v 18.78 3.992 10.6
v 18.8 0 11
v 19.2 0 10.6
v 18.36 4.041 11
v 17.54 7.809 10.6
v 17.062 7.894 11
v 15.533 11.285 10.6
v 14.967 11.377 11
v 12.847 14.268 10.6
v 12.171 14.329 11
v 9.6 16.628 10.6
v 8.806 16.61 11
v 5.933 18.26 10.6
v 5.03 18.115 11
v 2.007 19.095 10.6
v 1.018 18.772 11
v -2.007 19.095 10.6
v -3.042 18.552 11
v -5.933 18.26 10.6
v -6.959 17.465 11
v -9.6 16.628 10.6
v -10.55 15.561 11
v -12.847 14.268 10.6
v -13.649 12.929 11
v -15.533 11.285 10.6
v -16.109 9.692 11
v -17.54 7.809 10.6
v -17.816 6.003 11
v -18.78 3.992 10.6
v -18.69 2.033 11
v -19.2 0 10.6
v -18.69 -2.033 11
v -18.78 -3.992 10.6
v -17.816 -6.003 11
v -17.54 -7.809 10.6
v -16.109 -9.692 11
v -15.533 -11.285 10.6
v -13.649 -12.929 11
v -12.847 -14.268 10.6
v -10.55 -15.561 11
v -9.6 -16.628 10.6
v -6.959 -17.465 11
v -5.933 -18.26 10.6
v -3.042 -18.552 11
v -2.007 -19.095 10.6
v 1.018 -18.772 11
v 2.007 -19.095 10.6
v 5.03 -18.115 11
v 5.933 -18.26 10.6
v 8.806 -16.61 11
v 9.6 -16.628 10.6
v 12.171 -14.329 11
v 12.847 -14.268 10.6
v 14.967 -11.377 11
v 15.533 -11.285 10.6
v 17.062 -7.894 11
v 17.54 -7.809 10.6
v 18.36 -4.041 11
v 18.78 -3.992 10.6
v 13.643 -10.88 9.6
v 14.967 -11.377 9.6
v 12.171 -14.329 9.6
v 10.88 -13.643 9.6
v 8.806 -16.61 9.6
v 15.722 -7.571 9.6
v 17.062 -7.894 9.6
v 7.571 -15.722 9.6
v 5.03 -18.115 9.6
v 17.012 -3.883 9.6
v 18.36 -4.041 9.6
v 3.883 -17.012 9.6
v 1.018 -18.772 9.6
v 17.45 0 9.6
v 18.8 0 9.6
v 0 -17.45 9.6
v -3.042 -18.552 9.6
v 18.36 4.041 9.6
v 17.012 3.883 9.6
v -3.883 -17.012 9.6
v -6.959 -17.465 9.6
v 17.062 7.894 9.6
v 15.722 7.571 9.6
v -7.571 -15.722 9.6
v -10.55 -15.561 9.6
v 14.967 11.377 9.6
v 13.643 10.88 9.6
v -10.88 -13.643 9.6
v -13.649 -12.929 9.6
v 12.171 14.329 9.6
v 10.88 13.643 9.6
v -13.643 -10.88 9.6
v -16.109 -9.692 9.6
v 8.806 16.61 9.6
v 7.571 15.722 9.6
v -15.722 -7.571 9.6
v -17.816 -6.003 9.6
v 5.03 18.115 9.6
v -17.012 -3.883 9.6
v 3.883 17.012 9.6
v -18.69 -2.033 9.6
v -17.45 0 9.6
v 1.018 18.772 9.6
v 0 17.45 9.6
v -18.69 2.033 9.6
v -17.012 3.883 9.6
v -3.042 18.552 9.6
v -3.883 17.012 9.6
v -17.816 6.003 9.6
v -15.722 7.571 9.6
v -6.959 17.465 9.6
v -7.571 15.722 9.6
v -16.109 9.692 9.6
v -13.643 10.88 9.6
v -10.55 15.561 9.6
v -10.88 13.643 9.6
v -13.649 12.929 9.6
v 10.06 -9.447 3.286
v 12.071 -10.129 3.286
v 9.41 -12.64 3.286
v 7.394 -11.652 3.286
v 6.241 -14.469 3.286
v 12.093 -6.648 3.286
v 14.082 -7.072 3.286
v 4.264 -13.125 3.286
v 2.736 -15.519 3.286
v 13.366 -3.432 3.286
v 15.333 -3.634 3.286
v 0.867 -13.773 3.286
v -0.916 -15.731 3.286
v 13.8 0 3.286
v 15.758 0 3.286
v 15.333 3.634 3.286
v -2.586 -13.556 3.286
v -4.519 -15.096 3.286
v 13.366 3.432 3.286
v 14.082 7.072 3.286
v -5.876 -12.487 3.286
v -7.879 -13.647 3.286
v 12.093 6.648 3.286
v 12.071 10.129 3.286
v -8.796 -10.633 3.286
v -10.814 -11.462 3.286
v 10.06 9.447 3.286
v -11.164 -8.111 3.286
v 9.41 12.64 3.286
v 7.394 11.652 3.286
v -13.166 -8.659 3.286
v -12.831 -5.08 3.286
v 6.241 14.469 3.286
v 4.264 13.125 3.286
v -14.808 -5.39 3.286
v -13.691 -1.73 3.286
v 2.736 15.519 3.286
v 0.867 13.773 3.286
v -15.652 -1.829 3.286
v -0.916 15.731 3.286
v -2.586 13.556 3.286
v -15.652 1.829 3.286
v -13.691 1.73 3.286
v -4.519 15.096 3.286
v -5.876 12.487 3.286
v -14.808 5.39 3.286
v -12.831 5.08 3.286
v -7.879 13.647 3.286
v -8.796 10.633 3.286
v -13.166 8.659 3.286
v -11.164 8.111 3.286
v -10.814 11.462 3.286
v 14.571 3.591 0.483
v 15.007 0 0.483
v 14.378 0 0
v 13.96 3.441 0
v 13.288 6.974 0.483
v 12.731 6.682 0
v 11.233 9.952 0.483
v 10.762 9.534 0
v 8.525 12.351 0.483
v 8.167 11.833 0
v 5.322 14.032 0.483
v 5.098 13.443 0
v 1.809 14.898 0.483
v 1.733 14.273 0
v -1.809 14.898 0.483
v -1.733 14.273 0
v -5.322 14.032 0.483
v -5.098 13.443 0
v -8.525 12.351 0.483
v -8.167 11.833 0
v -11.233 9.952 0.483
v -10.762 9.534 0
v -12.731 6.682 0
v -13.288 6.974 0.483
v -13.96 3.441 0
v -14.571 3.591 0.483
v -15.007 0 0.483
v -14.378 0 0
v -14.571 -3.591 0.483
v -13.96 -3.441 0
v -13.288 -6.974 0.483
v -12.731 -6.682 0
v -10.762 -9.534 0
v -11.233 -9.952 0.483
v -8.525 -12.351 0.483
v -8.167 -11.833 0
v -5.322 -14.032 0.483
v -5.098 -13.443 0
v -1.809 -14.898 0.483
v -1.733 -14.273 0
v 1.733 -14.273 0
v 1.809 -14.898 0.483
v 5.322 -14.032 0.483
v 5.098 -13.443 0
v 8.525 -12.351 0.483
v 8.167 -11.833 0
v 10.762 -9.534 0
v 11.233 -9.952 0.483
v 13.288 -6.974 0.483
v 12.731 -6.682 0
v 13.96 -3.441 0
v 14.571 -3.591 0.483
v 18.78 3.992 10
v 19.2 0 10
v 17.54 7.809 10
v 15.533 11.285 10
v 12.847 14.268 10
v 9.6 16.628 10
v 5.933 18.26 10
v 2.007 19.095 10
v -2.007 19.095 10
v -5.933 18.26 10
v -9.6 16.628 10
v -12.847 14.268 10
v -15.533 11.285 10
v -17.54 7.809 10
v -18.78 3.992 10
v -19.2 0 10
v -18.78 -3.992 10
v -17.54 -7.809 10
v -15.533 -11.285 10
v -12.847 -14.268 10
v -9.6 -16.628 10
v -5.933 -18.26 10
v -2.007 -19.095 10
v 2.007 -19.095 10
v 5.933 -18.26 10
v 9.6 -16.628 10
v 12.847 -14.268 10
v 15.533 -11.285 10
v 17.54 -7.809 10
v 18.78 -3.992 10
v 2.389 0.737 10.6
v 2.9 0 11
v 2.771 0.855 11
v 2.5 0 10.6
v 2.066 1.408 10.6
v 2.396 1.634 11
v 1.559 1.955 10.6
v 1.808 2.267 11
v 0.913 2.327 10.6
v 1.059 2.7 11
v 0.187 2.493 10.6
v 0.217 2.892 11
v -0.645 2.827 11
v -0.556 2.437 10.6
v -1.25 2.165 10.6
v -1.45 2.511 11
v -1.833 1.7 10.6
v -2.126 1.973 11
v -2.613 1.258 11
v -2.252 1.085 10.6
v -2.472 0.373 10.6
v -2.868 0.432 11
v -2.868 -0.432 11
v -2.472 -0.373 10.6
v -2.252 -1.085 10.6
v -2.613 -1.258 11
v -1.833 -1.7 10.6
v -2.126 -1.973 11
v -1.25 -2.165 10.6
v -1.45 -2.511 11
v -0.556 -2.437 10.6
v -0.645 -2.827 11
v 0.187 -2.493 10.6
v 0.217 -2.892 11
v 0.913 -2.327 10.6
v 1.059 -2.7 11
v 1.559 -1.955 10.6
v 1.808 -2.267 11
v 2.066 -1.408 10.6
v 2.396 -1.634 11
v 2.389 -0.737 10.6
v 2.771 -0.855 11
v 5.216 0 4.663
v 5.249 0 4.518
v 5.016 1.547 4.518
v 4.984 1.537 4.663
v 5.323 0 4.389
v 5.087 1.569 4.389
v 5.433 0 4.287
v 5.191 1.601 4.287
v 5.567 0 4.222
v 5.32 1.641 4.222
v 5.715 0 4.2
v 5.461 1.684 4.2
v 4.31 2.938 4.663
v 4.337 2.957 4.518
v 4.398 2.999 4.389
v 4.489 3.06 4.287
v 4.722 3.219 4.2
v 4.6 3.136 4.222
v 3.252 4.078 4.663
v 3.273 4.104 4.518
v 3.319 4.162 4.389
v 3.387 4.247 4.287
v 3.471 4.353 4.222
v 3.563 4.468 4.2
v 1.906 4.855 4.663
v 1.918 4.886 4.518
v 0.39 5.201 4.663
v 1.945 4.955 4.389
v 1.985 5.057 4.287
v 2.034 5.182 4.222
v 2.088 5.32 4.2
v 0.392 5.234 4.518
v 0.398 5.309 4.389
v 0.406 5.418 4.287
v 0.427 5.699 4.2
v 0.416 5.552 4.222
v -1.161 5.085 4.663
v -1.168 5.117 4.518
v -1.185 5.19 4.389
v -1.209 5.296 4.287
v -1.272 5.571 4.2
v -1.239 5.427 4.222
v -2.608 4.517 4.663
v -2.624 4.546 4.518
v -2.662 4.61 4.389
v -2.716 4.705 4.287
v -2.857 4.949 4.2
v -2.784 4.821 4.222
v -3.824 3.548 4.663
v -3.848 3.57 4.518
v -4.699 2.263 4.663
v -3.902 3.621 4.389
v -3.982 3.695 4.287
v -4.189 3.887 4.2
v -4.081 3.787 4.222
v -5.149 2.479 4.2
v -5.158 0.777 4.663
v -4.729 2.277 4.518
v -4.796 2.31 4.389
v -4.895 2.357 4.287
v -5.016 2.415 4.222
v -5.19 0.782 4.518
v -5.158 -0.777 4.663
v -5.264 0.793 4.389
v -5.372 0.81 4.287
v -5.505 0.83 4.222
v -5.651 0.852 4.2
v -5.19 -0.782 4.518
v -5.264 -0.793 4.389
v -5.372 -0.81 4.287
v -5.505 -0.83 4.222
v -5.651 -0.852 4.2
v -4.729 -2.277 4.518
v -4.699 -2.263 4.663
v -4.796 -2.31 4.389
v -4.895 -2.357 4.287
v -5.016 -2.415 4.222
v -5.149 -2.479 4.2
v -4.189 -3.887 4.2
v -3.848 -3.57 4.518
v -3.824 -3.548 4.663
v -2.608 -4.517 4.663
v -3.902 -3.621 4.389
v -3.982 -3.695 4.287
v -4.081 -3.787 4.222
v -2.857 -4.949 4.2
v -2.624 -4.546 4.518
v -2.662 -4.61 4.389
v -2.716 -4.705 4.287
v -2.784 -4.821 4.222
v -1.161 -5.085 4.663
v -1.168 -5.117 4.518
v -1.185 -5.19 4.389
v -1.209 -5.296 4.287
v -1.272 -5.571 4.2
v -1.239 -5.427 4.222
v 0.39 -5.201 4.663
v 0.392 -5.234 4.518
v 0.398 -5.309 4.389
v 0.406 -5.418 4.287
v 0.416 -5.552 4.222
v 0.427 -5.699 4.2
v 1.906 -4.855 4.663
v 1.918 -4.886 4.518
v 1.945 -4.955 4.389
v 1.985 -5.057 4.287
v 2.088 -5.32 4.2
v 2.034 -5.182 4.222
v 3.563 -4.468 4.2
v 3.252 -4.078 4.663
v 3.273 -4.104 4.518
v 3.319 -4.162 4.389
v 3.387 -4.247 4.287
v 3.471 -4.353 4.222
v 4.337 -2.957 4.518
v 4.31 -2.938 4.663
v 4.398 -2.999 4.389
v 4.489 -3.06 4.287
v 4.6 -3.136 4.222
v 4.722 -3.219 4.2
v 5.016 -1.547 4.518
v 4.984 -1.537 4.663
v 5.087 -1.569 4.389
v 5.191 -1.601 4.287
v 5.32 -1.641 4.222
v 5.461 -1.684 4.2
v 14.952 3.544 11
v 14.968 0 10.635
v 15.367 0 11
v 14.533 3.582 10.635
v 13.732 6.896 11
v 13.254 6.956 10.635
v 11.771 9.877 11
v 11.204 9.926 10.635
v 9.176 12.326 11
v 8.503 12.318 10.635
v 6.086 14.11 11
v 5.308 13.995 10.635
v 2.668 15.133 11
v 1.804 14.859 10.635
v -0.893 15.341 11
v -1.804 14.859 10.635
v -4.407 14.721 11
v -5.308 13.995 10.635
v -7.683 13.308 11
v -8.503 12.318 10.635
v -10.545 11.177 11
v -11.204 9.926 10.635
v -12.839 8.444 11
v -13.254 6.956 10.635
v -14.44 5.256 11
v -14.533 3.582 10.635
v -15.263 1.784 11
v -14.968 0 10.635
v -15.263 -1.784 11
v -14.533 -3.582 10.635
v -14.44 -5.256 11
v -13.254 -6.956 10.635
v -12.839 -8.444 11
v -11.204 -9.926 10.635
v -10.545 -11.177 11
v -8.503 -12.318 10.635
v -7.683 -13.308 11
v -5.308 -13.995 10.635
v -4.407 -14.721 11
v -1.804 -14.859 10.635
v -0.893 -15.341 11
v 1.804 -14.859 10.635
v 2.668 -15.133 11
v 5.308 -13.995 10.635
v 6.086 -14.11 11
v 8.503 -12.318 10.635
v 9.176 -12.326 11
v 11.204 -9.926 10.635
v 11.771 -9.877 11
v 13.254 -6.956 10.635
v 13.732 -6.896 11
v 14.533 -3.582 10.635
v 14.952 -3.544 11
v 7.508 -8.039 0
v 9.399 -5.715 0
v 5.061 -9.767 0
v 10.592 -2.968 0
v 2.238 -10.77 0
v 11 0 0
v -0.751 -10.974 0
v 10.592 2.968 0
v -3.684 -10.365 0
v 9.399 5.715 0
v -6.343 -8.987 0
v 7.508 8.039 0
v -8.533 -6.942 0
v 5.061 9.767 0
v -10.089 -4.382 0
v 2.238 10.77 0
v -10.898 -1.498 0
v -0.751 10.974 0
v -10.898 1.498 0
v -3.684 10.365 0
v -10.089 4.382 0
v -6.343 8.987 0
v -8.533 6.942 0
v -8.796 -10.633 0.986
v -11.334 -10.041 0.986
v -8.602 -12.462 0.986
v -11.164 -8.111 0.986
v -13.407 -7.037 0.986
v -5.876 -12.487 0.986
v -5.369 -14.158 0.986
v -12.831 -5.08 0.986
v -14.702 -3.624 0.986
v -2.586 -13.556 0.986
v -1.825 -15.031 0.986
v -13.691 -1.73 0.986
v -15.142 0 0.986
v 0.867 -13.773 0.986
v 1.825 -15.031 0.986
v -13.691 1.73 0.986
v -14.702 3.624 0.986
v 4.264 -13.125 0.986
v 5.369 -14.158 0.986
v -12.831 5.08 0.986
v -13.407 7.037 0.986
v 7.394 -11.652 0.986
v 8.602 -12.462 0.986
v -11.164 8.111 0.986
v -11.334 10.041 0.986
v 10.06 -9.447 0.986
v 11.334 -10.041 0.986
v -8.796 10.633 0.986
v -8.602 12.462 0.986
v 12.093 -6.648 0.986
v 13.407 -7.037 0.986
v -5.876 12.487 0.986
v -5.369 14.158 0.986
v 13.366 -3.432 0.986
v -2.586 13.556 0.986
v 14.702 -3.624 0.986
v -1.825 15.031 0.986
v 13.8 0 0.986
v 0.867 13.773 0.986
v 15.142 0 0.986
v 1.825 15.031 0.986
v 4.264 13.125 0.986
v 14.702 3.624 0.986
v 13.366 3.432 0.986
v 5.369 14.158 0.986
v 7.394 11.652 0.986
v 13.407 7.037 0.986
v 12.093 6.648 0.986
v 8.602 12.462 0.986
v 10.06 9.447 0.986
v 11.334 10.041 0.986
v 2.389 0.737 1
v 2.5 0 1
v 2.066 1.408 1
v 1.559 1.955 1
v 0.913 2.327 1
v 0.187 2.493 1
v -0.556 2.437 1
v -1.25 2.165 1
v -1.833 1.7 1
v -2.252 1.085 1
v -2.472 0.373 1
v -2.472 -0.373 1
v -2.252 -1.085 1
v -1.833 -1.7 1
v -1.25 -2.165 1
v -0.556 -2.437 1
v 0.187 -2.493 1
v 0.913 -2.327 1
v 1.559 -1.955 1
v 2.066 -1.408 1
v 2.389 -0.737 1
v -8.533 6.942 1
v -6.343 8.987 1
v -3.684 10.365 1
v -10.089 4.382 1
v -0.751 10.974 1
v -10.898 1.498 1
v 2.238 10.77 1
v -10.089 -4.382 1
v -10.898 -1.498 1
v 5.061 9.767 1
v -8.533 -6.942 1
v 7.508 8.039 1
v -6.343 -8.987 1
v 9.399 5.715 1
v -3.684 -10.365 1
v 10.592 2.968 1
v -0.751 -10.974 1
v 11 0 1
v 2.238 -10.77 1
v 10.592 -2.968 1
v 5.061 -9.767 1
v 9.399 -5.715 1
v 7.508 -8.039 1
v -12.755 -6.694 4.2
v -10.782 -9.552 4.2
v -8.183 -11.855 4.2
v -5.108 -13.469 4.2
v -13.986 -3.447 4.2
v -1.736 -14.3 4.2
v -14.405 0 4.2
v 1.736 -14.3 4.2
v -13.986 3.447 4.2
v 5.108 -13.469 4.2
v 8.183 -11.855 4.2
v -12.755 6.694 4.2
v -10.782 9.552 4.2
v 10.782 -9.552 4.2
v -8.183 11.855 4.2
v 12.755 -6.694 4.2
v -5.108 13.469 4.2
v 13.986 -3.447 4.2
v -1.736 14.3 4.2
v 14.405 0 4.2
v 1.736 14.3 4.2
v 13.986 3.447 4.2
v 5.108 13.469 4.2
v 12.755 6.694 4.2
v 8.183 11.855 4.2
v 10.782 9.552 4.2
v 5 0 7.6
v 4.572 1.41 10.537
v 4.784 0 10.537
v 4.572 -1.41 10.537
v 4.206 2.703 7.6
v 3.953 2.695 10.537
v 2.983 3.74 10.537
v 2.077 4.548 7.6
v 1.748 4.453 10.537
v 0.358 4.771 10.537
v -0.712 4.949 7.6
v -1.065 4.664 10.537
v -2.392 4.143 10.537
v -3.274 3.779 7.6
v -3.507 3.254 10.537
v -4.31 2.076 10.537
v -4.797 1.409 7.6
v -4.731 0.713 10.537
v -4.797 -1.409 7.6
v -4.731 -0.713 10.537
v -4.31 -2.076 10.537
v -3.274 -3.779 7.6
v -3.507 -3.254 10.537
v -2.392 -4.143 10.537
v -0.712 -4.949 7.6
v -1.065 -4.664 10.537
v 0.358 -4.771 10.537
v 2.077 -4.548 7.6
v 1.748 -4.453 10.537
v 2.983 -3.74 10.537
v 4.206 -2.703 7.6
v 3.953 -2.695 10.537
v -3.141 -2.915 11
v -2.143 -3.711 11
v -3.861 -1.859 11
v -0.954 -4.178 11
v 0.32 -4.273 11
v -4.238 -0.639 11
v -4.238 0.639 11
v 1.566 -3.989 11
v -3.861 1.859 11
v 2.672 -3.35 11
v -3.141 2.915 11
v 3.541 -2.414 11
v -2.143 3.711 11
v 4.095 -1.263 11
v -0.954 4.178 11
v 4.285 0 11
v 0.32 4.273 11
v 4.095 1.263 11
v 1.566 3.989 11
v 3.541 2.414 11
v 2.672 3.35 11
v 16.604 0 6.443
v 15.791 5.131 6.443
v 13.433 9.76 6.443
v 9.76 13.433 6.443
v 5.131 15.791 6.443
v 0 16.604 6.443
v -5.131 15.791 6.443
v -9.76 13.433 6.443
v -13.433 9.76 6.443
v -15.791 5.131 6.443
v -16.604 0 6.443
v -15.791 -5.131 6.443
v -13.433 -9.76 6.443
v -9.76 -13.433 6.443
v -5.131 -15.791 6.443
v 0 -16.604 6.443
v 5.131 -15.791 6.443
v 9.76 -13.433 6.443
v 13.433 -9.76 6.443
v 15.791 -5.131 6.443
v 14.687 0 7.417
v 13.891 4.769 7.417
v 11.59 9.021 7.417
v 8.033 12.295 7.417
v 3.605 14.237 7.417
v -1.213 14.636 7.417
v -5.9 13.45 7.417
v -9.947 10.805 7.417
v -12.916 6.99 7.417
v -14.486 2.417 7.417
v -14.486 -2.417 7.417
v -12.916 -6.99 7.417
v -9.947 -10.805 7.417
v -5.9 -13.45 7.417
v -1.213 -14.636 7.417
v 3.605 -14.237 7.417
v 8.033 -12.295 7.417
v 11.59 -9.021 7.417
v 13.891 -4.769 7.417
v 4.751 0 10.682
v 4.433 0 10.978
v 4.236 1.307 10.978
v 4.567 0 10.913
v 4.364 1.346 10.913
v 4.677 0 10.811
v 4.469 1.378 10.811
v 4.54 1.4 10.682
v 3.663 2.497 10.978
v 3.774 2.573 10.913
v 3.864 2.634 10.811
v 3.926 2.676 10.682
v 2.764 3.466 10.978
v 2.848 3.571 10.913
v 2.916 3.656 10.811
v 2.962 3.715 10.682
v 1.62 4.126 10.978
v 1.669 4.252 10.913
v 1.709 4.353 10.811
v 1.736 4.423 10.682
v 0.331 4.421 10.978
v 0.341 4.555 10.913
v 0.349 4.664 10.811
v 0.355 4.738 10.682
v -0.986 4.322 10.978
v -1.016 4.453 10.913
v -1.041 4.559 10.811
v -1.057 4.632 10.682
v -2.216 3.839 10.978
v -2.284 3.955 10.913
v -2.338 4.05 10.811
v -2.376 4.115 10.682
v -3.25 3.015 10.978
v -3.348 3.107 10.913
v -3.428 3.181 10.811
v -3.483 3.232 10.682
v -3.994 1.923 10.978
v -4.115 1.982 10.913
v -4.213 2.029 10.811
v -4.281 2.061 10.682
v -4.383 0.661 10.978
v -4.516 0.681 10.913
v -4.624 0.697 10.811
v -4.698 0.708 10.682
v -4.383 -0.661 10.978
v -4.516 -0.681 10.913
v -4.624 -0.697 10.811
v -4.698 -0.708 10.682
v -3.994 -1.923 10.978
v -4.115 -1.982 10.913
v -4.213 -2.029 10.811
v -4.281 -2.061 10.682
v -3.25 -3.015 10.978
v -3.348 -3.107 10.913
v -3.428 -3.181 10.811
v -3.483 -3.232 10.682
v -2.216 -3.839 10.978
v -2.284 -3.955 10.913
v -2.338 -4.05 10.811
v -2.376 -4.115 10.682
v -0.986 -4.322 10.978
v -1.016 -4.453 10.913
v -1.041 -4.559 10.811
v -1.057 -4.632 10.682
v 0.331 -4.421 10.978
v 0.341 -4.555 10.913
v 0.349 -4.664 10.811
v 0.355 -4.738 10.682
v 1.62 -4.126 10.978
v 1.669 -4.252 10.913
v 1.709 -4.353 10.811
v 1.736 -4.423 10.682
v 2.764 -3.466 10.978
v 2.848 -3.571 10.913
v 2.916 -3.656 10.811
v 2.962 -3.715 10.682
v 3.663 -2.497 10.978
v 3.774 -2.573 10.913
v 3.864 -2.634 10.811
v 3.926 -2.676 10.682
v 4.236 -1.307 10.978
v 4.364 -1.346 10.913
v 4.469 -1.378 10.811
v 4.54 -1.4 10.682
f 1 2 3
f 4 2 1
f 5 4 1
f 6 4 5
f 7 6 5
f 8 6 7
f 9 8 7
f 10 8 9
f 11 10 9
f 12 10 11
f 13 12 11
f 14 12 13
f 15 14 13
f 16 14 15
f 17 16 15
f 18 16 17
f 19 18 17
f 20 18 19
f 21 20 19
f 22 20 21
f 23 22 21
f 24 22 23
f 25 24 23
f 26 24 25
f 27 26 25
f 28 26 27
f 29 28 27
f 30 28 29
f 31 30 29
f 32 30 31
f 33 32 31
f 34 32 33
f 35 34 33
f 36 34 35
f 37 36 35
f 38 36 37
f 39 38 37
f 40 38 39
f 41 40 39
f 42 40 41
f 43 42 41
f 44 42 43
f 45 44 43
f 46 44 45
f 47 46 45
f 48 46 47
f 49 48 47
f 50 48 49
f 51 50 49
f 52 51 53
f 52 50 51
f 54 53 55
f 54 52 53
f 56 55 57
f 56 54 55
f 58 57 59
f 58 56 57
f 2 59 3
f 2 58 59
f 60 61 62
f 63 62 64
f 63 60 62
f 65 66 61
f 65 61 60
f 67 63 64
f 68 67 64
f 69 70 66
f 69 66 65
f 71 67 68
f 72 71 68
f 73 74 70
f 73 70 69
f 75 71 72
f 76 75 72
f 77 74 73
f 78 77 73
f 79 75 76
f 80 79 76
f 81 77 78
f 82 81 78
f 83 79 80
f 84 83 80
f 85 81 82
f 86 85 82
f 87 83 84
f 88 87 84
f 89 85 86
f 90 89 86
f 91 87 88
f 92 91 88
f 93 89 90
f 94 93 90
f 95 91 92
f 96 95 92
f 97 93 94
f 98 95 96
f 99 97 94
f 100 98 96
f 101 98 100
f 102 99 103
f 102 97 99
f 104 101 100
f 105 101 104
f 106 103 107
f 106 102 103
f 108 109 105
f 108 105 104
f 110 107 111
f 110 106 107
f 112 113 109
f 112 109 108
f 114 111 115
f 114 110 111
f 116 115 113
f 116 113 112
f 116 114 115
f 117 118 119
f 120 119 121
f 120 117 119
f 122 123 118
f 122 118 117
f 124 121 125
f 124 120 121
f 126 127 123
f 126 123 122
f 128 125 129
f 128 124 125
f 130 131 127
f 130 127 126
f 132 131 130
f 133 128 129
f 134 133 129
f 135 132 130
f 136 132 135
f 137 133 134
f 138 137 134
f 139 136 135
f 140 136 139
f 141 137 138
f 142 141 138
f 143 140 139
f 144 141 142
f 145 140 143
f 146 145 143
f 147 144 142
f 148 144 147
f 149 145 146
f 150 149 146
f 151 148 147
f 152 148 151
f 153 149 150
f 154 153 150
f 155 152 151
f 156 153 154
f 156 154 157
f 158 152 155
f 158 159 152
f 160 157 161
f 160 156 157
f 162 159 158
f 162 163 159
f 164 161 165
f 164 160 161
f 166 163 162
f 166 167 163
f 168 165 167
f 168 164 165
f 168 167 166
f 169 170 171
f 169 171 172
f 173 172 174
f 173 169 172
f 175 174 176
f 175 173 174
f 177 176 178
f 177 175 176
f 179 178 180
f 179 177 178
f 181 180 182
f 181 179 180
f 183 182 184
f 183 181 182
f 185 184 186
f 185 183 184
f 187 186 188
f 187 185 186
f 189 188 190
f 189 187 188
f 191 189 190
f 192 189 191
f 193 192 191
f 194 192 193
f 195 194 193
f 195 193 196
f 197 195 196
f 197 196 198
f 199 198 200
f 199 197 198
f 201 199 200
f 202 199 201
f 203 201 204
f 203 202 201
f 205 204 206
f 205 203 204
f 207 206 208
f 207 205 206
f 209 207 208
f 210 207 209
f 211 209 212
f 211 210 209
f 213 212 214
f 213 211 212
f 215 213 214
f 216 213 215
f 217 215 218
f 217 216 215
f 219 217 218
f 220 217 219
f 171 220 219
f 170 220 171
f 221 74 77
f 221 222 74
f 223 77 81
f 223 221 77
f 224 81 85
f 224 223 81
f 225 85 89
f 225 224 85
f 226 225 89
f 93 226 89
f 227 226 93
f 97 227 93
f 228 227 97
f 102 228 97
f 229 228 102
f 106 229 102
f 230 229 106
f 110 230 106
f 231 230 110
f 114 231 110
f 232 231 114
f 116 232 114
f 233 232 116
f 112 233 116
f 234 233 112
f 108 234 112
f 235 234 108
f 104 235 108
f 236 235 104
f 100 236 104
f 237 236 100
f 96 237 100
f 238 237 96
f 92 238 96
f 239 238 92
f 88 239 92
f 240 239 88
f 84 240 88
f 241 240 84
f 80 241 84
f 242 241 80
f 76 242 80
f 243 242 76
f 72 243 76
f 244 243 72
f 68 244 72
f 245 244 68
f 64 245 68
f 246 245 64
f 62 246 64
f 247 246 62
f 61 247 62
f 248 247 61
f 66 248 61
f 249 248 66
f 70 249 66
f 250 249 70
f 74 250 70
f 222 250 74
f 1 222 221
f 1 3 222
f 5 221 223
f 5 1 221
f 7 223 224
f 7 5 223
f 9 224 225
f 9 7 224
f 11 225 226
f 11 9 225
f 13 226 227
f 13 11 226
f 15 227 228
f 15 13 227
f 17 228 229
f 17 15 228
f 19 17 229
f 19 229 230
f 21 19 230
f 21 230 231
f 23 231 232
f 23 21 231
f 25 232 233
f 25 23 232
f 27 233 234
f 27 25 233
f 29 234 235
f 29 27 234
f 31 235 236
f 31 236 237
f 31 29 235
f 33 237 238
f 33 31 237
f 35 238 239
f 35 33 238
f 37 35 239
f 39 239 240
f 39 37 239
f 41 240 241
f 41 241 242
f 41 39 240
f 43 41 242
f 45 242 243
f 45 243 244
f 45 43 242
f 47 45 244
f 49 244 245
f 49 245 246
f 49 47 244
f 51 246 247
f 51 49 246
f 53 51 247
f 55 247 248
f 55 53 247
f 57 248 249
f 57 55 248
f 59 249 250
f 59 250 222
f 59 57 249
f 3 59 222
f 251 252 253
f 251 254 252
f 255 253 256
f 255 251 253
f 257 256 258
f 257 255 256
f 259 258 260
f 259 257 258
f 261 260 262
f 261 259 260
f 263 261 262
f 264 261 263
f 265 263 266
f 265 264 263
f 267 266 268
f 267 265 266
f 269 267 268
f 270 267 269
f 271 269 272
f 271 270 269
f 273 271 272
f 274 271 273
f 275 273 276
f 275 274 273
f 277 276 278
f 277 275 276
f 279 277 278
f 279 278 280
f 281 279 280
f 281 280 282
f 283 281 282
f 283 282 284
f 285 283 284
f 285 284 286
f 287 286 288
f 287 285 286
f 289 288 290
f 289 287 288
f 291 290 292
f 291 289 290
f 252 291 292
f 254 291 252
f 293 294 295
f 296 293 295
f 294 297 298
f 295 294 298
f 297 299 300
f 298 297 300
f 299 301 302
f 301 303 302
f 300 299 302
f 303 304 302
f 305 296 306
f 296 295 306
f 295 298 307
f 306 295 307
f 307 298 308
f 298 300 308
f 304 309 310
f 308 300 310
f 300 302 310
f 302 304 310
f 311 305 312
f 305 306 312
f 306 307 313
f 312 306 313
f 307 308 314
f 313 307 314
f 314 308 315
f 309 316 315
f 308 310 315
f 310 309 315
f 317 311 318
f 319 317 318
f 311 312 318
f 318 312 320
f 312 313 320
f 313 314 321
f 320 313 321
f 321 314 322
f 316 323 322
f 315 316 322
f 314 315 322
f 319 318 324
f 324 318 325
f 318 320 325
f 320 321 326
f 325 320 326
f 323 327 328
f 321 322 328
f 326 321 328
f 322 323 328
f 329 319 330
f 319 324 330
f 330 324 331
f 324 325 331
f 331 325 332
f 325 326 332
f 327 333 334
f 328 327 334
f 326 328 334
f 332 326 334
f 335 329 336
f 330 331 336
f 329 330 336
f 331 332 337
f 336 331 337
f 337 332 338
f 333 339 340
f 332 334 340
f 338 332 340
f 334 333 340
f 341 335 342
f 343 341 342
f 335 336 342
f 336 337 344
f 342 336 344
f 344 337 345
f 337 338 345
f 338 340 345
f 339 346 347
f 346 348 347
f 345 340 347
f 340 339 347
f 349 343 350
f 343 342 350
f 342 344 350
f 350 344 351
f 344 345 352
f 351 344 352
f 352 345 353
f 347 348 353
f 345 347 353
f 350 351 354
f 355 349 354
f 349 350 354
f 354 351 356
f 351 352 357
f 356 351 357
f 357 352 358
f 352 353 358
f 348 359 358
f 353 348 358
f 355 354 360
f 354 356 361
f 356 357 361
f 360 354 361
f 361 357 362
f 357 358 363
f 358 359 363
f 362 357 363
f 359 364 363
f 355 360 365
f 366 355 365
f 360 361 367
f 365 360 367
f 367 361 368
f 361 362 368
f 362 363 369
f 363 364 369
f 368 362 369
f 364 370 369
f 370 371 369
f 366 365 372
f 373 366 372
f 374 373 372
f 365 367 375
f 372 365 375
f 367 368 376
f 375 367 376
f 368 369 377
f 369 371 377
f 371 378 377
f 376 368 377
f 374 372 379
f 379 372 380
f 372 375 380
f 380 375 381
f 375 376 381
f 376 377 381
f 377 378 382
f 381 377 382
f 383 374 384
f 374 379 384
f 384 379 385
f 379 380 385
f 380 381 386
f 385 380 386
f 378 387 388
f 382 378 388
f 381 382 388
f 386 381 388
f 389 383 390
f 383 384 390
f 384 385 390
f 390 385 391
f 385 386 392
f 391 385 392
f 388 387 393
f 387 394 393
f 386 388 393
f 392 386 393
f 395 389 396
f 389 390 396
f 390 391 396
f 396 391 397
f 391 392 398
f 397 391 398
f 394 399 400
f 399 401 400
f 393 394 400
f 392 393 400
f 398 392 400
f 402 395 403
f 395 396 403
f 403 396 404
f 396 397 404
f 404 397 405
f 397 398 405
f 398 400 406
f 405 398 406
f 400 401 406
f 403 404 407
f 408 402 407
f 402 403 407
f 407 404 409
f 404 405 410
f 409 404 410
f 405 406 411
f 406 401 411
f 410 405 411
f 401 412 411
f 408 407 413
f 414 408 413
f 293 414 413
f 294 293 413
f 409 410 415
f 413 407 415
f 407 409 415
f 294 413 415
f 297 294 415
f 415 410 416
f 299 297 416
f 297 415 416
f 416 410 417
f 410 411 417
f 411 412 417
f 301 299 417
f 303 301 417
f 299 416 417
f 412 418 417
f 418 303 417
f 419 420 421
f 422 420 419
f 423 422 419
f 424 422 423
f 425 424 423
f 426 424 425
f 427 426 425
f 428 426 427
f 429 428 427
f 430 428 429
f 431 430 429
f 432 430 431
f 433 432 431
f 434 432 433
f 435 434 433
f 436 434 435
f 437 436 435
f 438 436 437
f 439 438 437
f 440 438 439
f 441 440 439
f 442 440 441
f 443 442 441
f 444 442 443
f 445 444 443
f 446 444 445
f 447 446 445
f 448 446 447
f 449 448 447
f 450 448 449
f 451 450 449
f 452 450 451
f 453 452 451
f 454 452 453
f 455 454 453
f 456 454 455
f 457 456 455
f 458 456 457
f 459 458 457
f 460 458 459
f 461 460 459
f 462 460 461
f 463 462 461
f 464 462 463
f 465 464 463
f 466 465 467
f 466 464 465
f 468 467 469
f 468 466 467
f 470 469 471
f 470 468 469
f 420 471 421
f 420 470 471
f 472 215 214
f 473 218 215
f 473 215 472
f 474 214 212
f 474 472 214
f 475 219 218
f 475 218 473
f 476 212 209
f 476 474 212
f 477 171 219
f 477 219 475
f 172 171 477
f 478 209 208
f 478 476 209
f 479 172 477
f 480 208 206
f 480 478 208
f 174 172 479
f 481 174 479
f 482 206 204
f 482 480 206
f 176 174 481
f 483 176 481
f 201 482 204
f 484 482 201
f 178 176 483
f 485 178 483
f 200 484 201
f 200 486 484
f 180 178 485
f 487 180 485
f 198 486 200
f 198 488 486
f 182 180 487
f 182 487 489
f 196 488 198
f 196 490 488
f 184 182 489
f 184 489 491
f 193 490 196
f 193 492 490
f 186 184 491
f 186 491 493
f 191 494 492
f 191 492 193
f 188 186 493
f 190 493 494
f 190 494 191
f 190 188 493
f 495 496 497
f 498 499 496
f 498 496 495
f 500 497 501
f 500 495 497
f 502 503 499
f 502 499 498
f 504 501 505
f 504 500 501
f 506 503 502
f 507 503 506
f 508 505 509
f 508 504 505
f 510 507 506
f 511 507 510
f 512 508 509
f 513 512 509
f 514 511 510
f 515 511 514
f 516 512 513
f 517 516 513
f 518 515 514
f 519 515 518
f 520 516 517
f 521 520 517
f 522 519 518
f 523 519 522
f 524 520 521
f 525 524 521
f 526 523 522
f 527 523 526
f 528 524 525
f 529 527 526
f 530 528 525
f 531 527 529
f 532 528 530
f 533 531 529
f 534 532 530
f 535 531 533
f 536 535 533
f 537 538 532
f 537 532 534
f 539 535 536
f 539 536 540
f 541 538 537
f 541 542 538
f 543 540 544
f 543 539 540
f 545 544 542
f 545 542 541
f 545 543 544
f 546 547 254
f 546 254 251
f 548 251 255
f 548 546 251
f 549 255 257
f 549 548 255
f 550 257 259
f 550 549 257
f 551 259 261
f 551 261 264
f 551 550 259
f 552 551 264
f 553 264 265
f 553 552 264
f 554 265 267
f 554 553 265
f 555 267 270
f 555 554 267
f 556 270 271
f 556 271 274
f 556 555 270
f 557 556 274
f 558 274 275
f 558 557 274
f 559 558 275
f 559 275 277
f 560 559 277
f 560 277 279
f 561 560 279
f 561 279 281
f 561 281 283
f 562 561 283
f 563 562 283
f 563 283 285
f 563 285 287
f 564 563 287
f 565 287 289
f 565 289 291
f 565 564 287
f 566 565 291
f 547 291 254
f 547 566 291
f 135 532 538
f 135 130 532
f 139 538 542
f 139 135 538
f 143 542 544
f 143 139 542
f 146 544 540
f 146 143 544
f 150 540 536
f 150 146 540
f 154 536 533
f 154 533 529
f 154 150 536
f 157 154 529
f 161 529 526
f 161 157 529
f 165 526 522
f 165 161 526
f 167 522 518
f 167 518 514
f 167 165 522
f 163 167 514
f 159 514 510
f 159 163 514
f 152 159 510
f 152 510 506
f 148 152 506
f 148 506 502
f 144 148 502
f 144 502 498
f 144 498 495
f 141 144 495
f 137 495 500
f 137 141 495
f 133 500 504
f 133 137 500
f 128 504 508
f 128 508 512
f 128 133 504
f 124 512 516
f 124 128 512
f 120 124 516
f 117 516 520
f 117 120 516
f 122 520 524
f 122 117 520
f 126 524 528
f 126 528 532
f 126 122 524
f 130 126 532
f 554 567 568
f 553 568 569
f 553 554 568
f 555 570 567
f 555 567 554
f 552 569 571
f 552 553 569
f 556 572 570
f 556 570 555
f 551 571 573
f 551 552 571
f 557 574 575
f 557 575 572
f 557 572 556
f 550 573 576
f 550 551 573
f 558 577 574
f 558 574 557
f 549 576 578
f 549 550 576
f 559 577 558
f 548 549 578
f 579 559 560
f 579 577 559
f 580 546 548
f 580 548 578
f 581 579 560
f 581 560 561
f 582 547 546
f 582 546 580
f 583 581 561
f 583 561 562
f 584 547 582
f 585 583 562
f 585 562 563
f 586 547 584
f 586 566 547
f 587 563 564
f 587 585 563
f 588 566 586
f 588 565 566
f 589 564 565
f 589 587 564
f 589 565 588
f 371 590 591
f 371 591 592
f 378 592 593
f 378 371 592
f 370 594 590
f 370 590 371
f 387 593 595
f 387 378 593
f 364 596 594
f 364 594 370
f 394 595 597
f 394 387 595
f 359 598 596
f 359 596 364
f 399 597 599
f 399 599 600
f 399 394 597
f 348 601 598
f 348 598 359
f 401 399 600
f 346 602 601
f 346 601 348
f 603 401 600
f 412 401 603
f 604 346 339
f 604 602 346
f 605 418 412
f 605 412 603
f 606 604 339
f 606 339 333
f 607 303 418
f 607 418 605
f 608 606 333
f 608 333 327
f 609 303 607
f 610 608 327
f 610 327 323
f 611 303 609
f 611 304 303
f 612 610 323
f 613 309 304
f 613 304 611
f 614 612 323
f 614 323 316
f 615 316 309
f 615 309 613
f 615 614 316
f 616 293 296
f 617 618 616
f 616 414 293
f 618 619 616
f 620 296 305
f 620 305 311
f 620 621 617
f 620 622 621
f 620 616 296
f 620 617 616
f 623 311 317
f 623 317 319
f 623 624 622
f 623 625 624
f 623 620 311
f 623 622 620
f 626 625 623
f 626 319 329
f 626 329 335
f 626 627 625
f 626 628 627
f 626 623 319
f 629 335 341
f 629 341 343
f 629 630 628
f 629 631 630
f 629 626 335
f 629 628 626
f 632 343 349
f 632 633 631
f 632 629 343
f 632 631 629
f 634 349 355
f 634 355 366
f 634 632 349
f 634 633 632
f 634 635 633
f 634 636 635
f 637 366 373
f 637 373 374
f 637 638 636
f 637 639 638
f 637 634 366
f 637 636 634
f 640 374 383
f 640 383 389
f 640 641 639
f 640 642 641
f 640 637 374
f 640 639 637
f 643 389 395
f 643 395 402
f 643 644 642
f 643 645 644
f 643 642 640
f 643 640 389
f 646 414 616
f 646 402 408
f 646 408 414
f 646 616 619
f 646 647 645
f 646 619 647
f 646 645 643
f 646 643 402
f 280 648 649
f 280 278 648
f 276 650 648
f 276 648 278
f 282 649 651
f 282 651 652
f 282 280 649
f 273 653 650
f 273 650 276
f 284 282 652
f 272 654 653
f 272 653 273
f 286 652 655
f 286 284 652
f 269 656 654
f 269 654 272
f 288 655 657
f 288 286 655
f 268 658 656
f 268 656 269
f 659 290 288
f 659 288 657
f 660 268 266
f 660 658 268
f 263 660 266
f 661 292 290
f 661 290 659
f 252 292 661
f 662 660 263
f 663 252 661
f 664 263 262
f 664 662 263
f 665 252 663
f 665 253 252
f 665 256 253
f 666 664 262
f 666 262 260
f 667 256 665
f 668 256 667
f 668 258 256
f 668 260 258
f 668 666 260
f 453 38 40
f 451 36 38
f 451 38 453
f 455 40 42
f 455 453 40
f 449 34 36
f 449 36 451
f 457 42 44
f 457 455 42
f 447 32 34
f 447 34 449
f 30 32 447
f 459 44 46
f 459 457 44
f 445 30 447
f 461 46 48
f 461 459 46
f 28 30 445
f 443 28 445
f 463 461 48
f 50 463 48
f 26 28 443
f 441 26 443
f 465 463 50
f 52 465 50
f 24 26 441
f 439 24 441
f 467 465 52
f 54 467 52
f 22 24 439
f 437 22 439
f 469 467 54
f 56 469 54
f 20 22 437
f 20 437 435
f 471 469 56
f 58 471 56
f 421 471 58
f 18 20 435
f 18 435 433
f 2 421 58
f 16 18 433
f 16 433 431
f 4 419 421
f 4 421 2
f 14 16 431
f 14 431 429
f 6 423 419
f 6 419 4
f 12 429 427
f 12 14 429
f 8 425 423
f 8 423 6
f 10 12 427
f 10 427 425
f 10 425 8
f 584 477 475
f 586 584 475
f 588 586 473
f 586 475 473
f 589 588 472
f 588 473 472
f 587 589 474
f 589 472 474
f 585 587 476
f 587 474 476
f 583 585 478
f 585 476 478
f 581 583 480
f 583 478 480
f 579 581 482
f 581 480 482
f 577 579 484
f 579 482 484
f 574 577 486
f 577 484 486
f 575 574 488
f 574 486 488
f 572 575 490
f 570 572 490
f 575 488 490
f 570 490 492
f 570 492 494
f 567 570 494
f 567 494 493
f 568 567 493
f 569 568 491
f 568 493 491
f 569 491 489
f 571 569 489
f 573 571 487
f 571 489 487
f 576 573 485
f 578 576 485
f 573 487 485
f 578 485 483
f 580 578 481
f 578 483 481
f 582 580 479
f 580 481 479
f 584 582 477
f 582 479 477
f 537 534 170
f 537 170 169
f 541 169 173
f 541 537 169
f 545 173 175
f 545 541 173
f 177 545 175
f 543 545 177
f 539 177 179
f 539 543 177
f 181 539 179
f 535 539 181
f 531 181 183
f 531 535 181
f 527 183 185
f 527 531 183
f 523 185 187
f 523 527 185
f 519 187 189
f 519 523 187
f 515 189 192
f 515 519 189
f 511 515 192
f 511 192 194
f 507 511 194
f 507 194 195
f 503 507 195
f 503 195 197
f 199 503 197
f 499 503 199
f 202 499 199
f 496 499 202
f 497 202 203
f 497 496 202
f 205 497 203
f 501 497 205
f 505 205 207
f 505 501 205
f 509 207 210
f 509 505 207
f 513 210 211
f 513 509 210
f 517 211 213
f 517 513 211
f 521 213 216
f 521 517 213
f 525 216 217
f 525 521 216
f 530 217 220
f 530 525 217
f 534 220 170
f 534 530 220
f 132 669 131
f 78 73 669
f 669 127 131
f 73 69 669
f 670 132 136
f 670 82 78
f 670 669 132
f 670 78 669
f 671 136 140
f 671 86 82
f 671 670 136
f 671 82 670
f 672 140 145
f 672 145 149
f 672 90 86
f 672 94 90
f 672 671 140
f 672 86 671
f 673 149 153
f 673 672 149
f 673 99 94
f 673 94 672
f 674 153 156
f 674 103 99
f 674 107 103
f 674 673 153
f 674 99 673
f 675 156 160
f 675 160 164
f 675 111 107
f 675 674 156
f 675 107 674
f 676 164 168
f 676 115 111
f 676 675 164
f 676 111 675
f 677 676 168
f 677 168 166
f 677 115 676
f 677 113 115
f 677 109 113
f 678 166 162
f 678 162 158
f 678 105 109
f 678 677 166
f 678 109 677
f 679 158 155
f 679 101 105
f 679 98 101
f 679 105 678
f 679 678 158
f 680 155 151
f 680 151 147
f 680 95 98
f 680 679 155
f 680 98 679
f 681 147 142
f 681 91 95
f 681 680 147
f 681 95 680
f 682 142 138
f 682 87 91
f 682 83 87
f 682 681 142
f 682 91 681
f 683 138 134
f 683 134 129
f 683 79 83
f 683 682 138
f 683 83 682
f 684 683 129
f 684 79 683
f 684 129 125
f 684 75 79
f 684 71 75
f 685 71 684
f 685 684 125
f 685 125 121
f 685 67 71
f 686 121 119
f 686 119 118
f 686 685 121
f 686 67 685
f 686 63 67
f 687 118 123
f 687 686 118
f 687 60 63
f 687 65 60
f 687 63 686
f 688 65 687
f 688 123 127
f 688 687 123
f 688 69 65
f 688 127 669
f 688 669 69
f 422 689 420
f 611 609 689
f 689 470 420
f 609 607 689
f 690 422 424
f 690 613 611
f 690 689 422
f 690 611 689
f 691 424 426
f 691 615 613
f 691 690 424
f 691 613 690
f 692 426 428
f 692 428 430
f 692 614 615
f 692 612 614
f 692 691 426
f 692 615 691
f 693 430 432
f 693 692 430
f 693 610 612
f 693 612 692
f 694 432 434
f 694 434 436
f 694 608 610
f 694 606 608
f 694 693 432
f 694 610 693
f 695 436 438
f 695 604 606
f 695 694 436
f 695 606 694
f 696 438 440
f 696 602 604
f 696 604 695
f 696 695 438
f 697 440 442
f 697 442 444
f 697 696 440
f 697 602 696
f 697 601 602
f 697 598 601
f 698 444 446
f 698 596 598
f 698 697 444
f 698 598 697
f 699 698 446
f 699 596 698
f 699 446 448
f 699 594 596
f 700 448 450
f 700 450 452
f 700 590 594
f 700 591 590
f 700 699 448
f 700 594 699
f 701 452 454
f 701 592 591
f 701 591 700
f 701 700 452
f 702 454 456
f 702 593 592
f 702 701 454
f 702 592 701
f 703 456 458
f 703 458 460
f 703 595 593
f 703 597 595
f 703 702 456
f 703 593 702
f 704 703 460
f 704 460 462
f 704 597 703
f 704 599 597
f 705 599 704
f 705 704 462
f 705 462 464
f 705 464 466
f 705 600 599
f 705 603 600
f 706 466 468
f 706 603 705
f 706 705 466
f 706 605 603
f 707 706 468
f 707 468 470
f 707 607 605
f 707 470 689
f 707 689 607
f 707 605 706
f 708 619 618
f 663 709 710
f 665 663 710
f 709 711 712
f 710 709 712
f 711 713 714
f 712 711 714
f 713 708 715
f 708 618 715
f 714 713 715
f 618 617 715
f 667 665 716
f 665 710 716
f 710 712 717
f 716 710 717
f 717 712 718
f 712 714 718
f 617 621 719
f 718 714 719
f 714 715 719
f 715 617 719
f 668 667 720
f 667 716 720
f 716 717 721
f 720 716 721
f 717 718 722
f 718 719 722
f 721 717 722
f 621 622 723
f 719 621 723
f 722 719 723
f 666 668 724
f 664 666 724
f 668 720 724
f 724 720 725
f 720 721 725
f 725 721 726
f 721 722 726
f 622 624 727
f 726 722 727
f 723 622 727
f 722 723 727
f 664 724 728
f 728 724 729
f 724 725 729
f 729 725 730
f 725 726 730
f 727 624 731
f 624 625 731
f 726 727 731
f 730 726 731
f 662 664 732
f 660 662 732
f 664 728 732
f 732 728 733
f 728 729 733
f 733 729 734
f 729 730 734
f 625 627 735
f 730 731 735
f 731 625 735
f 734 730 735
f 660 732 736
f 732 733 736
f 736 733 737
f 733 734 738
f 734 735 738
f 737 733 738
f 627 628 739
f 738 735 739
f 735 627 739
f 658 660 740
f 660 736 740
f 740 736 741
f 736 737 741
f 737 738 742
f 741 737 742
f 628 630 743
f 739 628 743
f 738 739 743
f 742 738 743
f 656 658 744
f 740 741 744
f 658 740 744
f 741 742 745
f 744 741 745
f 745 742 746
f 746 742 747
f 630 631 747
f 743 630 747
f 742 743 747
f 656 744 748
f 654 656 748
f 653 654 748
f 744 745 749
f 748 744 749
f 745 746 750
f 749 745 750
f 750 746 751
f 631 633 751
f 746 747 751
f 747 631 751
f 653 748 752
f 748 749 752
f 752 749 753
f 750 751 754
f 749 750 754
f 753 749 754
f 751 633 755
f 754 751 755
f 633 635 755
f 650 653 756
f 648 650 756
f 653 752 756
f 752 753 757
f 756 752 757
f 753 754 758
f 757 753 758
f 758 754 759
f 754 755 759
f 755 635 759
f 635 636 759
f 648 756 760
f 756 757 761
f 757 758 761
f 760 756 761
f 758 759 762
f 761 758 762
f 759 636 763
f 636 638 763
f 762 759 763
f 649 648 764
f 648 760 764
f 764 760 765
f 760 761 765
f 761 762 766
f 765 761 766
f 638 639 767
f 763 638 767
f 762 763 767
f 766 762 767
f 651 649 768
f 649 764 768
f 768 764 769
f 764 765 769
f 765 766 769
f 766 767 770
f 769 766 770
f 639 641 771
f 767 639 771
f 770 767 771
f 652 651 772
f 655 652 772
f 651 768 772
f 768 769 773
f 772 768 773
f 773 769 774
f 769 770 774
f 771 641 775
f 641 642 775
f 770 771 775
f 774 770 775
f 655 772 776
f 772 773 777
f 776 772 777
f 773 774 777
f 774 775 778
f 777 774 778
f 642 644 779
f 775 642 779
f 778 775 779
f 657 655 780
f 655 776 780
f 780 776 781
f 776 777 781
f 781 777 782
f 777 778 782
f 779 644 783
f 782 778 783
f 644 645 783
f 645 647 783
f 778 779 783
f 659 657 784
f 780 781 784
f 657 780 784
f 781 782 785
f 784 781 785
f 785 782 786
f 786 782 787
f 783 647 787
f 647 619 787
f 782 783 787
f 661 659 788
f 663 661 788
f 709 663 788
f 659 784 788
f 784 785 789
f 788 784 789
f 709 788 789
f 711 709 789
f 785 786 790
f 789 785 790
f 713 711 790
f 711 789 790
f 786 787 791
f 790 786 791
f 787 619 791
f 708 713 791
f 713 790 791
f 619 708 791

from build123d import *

# Parameters (mm, degrees)
F3_R     = 0.5
F4_R     = 11
F5_DEPTH = 1
F6_SIZE  = 0.5


# Not quite as in the source:
# - a fillet or chamfer that OpenCascade refuses, or shapes differently, is made with other operations: its cross-section is extruded or revolved along the edge and cut away or added


with BuildPart() as f1:
    # F0 (on Front) → F1 (revolve)
    with BuildSketch(Plane.XZ):
        Polygon((4.75, 11), (2.5, 11), (2.5, 0), (14.8776877527, 0), (15.1418584287, 0.9858983849), (13.8, 0.9858983849), (13.8, 3.2858983849), (15.7581415713, 3.2858983849), (17.45, 9.6), (19.2, 9.6), (19.2, 11), (15, 11), (14.405077088, 4.2), (5.25, 4.2), align=None)
    revolve(axis=Axis((0, 0, 5.5), (0, 0, 1)))

    # F2: chamfer of 0.4 on 4 edges, made by hand

    # F2_s1 → F2_t2 (revolve, cut)
    with BuildSketch(Plane.XZ):
        Polygon((2.9, 11), (2.5, 10.6), (2.5, 11), align=None)
    revolve(axis=Axis((0, 0, 11), (0, 0, 1)), mode=Mode.SUBTRACT)

    # F2_s3 → F2_t4 (revolve, cut)
    with BuildSketch(Plane.XZ):
        Polygon((19.2, 10.6), (18.8, 11), (19.2, 11), align=None)
    revolve(axis=Axis((0, 0, 11), (0, 0, 1)), mode=Mode.SUBTRACT)

    # F2_s5 → F2_t6 (revolve, cut)
    with BuildSketch(Plane.XZ):
        Polygon((15.3665324696, 11), (14.9680545904, 10.6348622971), (15, 11), align=None)
    revolve(axis=Axis((0, 0, 11), (0, 0, 1)), mode=Mode.SUBTRACT)

    # F2_s7 → F2_t8 (revolve, cut)
    with BuildSketch(Plane.XZ):
        Polygon((18.8, 9.6), (19.2, 10), (19.2, 9.6), align=None)
    revolve(axis=Axis((0, 0, 9.6), (0, 0, 1)), mode=Mode.SUBTRACT)

    # F3
    f3_edges = [f1.edges().sort_by_distance(p)[0] for p in [
        (-5.25, 0, 4.2),
        (-4.75, 0, 11),
        (5, 0, 7.6),
    ]]
    fillet(f3_edges, radius=F3_R)

    # F4 (on face) → F5 (cut)
    with BuildSketch(Plane(origin=(0, 0, 0), x_dir=(1, 0, 0), z_dir=(0, 0, -1))):
        Circle(F4_R)
    extrude(amount=-F5_DEPTH, mode=Mode.SUBTRACT)

    # F6
    f6_edges = [f1.edges().sort_by_distance(p)[0] for p in [
        (-14.877688, 0, 0),
    ]]
    chamfer(f6_edges, length=F6_SIZE)


solid = f1.part
